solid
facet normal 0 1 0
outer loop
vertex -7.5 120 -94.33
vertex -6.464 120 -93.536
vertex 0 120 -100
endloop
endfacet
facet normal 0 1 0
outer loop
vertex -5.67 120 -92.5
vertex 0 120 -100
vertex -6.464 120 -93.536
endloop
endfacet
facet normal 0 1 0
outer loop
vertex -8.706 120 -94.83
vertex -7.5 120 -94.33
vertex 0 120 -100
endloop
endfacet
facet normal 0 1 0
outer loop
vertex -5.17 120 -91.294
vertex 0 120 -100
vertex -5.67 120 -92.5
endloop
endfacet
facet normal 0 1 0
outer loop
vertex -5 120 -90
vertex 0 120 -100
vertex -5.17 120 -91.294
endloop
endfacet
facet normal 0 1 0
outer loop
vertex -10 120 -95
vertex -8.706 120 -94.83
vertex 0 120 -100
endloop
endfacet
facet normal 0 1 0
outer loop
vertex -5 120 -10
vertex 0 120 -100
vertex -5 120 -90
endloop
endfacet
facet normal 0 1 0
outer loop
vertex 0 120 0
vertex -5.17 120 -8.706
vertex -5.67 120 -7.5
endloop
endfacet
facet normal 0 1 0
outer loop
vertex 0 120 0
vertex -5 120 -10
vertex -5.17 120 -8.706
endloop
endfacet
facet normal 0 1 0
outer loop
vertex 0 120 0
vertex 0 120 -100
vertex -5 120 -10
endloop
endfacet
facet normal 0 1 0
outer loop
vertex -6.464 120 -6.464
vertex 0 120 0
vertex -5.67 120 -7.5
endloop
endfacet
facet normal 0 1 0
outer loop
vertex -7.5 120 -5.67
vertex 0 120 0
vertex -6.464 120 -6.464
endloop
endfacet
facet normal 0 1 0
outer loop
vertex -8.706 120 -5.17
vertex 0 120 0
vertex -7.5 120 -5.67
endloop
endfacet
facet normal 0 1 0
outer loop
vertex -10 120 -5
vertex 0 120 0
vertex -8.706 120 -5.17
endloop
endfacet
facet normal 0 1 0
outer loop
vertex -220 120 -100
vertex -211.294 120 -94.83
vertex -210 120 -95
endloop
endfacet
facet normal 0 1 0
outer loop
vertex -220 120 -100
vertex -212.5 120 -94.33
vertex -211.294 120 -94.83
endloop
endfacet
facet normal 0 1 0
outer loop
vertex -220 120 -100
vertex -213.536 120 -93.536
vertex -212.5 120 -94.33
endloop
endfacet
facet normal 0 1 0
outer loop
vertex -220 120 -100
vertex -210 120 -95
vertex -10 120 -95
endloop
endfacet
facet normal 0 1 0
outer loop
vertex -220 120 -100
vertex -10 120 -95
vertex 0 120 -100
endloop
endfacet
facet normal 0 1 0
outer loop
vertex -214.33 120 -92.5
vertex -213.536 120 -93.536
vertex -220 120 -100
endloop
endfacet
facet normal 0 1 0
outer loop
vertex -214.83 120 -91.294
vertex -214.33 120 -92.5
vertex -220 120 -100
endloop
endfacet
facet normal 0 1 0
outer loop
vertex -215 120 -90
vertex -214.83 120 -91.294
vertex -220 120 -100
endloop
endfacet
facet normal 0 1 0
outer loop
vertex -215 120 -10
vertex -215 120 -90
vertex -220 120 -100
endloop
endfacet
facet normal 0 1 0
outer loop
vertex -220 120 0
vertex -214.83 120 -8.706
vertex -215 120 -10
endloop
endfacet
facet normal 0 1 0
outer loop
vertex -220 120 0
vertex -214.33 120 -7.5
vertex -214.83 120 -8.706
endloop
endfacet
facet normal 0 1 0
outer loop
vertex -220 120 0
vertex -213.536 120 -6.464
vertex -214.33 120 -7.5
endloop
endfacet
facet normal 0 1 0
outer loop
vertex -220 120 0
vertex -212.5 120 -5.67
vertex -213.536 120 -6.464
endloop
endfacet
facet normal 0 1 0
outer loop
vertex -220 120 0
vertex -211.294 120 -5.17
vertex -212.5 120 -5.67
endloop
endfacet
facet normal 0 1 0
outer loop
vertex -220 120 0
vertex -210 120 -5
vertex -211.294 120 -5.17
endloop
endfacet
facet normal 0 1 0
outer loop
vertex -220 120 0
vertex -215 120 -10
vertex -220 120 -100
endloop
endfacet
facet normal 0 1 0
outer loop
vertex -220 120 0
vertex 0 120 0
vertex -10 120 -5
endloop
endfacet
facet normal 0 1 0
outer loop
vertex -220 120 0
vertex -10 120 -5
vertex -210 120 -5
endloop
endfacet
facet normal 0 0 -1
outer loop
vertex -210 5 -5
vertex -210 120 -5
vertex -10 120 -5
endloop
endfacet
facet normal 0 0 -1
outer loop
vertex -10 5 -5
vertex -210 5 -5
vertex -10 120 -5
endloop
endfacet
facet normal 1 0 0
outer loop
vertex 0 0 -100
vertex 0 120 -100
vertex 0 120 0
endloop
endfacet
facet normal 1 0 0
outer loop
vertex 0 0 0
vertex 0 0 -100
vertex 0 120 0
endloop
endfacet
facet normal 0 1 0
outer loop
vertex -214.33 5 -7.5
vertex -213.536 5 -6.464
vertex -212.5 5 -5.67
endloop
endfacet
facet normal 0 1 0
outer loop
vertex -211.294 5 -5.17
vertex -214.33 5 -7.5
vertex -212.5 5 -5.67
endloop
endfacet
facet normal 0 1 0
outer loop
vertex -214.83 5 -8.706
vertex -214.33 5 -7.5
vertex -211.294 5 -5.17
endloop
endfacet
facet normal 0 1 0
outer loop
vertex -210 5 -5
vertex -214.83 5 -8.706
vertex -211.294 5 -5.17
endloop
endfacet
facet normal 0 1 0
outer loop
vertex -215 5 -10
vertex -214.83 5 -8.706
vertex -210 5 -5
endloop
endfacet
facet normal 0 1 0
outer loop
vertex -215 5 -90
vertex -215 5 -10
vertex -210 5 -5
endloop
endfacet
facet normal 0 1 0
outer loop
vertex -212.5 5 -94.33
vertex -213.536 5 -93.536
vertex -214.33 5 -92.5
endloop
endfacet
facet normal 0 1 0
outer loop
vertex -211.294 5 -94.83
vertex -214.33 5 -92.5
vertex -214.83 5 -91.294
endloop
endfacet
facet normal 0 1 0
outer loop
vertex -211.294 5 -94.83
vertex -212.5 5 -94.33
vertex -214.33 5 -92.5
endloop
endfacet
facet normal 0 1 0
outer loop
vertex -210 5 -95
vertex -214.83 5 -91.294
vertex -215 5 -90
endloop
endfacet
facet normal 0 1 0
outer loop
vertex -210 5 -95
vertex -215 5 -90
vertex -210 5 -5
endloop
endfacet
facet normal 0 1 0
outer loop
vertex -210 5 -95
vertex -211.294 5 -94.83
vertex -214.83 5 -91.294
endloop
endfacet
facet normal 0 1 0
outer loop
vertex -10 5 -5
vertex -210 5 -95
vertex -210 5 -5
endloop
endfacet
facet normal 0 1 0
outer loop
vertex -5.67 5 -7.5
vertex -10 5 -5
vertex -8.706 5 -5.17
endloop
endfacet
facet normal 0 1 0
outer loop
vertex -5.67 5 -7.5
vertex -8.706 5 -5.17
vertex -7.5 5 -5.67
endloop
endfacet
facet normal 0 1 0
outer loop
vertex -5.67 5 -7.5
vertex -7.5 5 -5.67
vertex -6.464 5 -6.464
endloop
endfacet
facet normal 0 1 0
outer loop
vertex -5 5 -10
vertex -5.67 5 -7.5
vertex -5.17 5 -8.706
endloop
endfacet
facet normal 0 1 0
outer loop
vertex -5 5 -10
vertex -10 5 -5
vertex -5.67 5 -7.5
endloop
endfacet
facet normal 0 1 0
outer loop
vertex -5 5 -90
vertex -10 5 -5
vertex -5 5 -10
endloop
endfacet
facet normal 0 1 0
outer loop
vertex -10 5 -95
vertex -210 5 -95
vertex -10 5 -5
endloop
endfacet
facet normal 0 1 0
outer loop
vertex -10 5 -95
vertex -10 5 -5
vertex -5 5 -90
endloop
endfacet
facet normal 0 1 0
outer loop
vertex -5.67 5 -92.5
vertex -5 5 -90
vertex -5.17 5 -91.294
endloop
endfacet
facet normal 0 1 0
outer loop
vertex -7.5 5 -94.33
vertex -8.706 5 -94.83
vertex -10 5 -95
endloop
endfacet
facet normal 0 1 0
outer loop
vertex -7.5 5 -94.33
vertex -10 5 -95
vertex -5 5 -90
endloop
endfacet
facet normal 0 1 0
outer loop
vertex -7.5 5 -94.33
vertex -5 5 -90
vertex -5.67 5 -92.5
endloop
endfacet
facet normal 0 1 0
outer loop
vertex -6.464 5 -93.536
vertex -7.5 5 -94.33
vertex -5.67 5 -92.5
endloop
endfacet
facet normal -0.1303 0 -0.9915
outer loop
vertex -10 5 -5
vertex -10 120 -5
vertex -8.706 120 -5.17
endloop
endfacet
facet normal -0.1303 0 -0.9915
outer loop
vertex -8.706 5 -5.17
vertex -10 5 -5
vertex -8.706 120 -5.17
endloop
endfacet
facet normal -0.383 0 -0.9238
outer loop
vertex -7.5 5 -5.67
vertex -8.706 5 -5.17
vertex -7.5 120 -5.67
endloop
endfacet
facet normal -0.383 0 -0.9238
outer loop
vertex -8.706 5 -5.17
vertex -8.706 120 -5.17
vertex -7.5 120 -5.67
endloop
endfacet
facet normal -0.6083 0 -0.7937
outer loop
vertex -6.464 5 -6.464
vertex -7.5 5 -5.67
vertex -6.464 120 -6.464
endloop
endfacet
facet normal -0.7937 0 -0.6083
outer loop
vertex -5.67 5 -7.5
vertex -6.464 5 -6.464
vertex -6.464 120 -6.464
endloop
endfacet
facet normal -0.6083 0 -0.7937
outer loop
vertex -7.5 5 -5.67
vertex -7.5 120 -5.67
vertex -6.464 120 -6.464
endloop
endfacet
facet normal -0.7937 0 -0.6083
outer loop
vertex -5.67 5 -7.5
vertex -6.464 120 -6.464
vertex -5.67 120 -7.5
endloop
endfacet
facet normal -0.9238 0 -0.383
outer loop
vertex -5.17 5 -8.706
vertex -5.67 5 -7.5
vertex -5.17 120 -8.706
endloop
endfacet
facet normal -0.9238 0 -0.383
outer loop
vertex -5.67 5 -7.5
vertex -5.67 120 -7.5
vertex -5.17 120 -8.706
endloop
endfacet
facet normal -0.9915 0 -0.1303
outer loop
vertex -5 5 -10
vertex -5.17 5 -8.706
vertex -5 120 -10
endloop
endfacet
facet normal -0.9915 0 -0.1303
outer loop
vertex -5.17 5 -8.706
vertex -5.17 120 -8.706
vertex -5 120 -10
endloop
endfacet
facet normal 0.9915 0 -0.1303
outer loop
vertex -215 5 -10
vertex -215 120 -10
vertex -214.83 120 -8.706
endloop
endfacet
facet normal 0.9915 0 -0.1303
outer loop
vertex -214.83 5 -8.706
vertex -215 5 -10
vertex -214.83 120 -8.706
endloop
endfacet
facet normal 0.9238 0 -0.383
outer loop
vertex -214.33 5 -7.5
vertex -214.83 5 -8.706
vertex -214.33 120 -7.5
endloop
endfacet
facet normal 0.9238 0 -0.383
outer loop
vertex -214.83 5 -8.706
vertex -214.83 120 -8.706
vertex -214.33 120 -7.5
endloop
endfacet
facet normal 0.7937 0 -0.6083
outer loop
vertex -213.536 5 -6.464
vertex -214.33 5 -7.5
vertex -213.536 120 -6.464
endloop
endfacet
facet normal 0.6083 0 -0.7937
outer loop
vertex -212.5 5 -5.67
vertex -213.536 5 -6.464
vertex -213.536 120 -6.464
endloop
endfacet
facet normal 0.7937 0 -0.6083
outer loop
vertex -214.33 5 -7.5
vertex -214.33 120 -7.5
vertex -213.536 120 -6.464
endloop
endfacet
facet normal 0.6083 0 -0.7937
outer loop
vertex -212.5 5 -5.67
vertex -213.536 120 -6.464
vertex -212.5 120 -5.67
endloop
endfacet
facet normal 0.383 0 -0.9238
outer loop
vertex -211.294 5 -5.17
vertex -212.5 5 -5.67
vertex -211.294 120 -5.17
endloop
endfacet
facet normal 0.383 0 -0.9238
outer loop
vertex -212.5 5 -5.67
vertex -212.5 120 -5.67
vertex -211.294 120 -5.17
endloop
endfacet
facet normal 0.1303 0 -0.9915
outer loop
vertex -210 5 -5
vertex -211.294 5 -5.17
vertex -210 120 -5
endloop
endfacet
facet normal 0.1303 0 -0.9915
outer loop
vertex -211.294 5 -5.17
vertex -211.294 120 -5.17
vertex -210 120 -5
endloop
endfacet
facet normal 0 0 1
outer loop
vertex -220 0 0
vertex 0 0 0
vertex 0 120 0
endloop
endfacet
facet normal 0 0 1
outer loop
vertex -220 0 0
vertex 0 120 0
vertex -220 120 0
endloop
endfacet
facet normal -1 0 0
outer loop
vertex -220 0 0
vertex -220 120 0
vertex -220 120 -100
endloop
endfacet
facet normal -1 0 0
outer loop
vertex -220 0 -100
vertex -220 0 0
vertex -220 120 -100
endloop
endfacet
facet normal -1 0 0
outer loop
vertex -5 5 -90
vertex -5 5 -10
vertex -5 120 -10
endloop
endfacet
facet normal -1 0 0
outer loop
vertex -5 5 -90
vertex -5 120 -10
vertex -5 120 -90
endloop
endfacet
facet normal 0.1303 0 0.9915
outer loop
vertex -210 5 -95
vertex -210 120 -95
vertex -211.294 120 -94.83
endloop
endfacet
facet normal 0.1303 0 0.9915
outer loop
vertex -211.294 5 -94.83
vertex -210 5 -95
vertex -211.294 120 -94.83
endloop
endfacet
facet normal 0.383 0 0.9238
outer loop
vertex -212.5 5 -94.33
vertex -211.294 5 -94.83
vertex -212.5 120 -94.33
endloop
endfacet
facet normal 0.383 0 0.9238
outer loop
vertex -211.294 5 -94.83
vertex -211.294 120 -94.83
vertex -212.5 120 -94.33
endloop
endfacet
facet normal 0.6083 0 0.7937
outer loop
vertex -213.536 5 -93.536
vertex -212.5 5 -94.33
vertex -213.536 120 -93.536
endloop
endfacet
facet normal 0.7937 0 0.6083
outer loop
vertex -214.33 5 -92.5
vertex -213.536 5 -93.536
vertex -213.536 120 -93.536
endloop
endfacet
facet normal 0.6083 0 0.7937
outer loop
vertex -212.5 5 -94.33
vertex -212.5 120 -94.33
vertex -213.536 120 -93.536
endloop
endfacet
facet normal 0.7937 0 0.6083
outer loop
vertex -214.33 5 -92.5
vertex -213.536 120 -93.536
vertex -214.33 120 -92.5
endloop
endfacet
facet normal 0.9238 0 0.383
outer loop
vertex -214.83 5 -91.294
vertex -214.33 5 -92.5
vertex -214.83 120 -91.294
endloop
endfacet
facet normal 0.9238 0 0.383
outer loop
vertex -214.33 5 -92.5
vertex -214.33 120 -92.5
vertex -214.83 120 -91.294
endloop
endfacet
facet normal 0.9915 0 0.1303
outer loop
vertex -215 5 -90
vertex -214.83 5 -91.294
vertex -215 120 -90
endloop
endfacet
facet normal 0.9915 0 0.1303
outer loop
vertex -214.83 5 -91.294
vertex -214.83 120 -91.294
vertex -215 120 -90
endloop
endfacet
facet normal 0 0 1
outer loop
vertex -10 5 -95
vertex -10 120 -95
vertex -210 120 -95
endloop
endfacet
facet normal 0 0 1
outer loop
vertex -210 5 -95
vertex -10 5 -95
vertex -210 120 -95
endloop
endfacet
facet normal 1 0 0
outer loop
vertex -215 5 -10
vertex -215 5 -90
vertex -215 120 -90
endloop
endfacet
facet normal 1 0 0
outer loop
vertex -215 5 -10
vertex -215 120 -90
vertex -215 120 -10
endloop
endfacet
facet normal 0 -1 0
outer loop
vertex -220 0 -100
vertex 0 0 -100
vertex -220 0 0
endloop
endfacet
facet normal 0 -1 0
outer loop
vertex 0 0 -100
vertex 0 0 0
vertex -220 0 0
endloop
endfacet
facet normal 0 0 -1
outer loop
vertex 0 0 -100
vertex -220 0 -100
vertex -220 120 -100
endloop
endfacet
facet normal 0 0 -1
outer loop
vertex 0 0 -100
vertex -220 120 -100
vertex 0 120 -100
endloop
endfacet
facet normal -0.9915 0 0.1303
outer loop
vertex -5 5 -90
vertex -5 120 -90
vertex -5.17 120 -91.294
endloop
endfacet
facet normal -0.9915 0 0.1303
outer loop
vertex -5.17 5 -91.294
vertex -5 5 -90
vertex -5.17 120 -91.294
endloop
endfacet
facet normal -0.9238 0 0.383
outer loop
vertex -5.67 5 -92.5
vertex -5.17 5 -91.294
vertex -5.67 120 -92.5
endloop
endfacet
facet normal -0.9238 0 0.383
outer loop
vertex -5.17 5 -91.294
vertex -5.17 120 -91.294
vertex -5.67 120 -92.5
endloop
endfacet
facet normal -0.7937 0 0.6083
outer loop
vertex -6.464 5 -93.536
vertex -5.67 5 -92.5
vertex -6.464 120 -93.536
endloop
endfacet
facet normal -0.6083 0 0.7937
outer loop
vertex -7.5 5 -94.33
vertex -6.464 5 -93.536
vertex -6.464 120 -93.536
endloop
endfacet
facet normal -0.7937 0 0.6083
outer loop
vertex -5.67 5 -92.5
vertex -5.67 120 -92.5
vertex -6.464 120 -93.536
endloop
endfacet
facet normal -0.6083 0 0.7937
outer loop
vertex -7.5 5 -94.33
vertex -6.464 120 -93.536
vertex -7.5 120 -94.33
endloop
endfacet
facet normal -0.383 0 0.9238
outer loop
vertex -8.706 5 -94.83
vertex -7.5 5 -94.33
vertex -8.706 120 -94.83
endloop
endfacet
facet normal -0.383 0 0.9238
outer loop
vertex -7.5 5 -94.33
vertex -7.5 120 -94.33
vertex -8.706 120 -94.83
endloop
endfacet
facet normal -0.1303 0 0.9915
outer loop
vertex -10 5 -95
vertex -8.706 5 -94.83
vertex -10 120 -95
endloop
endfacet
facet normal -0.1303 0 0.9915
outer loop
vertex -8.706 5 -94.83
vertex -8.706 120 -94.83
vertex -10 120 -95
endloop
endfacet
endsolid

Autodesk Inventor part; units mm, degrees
ref_plane "YZ Plane" through (0, 0, 0) normal (1, 0, 0) x (0, 1, 0)
ref_plane "XZ Plane" through (0, 0, 0) normal (0, 1, 0) x (-1, 0, 0)
ref_plane "XY Plane" through (0, 0, 0) normal (0, 0, 1) x (1, 0, 0)
sketch "Sketch1" plane through (0, 0, 0) normal (0, 1, 0) x (-1, 0, 0)
  line L0 (0, 0) -> (220, 0)
  line L1 (220, 0) -> (220, -100)
  line L2 (220, -100) -> (0, -100)
  line L3 (0, -100) -> (0, 0)
  dimension "d0" = 220
  dimension "d1" = 100
extrude "Extrusion1" add sketch "Sketch1" along normal blind 120
sketch "Sketch2" plane through (0, 120, 0) normal (0, 1, 0) x (1, 0, 0)
  line L0 (-210, 5) -> (-10, 5)
  line L1 (-5, 10) -> (-5, 90)
  line L2 (-10, 95) -> (-210, 95)
  line L3 (-215, 90) -> (-215, 10)
  line L4 (-220, 100) -> (-220, 0) projected
  line L5 (0, 0) -> (0, 100) projected
  arc A0 (-210, 95) -> (-215, 90) centre (-210, 90) ccw
  arc A1 (-5, 90) -> (-10, 95) centre (-10, 90) ccw
  arc A2 (-10, 5) -> (-5, 10) centre (-10, 10) ccw
  arc A3 (-215, 10) -> (-210, 5) centre (-210, 10) ccw
  point P0 (-215, 5)
  point P1 (-5, 95)
  point P2 (-5, 5)
  point P3 (-215, 95)
  dimension "d4" = 5
  dimension "d5" = 5
  dimension "d6" = 5
  dimension "d7" = 5
  dimension "d8" = 5
extrude "Extrusion2" cut sketch "Sketch2" against normal blind 115
properties part number "balde"
